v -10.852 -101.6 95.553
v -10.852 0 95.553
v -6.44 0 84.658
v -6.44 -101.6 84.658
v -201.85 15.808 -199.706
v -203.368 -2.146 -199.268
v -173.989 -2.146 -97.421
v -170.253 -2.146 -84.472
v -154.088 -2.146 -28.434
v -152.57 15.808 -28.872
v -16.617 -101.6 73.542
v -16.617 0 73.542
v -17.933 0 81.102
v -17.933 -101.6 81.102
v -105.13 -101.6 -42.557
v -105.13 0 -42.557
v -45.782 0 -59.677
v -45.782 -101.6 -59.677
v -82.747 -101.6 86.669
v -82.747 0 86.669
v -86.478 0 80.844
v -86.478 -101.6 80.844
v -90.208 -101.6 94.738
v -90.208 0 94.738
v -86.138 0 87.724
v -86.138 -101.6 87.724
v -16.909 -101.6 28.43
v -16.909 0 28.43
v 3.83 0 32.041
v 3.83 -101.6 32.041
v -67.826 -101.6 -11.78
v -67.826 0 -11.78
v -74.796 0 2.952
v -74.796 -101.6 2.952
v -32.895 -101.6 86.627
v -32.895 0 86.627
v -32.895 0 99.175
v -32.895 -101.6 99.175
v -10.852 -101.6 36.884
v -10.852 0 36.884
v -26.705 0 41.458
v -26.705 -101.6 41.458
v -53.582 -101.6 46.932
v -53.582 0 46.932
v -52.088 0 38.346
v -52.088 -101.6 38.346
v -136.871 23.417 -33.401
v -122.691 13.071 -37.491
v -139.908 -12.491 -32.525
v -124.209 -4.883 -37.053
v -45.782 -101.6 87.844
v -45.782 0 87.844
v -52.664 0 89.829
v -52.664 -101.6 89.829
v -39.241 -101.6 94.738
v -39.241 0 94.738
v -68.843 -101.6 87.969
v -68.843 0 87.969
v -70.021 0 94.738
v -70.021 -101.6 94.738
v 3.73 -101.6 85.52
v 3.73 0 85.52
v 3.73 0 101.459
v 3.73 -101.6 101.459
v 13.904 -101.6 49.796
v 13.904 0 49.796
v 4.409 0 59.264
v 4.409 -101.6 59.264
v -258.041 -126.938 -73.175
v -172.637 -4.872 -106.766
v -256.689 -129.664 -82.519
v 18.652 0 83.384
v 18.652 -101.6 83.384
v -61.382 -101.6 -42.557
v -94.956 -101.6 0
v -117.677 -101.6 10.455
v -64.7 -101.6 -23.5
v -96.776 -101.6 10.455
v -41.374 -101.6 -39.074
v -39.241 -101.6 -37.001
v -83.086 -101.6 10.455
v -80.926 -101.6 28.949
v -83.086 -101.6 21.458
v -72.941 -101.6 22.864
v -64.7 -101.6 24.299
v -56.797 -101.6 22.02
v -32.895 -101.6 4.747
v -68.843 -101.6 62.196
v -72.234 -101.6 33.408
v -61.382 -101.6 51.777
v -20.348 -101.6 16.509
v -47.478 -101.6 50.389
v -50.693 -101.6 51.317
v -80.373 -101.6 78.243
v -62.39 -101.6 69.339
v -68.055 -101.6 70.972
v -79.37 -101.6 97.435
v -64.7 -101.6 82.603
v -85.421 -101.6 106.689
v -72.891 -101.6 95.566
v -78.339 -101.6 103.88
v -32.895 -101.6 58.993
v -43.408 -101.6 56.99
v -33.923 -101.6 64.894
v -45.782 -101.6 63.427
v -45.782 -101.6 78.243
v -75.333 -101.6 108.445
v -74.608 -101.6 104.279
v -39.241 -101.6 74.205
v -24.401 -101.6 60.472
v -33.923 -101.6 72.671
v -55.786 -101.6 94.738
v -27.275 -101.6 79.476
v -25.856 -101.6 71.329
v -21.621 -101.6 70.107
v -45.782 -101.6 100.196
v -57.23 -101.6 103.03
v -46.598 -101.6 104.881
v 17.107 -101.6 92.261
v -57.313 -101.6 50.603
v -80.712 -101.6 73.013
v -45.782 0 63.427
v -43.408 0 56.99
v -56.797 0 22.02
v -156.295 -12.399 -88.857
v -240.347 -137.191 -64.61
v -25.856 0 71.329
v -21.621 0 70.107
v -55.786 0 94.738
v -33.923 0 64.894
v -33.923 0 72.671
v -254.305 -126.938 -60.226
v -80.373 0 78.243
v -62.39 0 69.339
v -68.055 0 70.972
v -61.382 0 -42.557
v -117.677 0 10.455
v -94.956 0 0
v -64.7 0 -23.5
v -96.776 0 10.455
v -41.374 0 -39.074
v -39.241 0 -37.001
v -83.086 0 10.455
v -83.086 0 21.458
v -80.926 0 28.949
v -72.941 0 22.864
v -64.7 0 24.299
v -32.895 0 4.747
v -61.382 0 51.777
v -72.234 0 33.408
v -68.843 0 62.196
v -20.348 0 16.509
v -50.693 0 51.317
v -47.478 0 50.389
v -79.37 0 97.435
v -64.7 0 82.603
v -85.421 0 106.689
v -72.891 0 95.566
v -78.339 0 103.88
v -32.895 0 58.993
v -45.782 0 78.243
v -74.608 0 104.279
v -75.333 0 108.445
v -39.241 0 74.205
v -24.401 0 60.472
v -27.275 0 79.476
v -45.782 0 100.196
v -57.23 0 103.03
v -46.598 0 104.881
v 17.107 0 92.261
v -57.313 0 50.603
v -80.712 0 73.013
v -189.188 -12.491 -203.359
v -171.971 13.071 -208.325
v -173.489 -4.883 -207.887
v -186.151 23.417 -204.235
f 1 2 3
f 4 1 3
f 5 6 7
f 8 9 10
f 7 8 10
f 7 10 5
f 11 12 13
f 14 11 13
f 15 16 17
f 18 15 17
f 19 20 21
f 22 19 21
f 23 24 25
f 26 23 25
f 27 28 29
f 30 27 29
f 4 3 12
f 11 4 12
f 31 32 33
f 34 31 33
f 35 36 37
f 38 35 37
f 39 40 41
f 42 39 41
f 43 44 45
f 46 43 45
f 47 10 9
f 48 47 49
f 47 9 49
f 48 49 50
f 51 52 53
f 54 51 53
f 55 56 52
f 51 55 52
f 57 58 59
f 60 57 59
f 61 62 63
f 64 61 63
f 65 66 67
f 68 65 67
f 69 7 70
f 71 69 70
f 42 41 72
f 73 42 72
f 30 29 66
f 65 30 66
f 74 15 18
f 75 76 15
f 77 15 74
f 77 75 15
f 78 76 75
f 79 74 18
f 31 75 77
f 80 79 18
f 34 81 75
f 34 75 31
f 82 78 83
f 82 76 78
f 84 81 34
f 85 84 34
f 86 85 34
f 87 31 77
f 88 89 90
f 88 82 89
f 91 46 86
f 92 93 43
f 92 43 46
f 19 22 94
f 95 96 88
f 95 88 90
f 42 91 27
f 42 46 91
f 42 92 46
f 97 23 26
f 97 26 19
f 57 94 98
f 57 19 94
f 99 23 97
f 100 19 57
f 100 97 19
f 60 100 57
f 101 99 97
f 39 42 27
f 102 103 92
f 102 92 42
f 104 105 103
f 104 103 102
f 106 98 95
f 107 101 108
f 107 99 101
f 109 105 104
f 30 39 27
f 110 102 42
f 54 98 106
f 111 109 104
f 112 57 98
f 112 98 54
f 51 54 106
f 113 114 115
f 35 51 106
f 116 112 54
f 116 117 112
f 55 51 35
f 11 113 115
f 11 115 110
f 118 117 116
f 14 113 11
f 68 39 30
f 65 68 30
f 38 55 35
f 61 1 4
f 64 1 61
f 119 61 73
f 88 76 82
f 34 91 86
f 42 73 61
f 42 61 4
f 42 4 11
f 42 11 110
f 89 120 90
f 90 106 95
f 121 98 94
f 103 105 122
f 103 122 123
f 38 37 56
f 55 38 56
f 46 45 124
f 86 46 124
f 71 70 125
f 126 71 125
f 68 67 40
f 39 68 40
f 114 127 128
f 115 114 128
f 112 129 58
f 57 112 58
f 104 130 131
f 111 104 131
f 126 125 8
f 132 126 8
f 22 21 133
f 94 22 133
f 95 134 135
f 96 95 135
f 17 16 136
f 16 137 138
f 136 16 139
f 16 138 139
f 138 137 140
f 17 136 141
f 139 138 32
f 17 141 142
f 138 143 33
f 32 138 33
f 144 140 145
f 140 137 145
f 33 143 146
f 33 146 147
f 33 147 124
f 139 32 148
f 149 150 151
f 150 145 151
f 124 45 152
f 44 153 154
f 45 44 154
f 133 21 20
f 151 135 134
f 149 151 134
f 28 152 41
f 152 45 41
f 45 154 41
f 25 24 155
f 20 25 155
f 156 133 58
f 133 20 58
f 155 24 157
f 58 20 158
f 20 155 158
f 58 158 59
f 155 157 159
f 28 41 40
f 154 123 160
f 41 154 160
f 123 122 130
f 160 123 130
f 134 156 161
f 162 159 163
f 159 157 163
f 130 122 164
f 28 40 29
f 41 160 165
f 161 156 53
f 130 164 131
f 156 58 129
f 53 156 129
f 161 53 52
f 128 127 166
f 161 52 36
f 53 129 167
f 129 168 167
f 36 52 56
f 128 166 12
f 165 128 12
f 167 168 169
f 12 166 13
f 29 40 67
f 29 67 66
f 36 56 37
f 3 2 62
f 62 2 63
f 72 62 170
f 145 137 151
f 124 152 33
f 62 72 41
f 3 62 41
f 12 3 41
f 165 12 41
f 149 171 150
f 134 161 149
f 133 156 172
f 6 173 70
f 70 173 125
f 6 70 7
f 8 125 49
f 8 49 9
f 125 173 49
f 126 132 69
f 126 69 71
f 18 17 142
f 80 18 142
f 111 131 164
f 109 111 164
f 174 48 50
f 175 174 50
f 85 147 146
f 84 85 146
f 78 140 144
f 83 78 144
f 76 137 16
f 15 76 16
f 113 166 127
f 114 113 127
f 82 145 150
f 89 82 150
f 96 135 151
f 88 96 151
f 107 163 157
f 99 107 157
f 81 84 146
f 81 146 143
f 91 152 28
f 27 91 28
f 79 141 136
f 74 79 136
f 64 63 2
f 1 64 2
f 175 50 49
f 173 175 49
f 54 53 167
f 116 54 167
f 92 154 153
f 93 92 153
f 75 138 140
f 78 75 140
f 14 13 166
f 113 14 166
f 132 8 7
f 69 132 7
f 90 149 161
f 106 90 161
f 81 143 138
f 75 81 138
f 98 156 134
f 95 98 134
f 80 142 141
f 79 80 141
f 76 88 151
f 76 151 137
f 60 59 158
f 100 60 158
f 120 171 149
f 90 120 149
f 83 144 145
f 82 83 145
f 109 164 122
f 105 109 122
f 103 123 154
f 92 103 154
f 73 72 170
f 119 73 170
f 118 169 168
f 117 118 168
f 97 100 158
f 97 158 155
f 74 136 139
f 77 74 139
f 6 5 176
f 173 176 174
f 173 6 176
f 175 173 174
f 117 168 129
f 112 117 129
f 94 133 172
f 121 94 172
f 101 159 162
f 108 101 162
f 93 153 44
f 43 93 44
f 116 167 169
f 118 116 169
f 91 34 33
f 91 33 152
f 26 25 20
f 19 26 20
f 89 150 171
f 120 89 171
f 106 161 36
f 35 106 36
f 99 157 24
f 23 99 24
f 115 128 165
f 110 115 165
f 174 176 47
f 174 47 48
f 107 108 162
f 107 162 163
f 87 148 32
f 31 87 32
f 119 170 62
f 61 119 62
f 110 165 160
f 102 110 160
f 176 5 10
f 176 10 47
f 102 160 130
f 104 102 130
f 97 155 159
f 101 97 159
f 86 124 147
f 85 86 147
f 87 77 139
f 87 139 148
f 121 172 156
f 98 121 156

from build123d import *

# Parameters (mm, degrees)
F1_DEPTH = 101.6
F3_DEPTH = 177.8
F5_DEPTH = 152.4


with BuildPart() as f1:
    # F0 (on Front) → F1 (new body)
    with BuildSketch(Plane.XZ):
        Polygon((-68.0546009286, 70.9724547934), (-68.8429325819, 62.1956735849), (-117.6773235202, 10.4552125558), (-105.1295995712, -42.5568968058), (-45.7822419703, -59.6766918898), (-39.2410605975, -37.0010799353), (-41.3735844195, -39.0737466514), (-61.3821223378, -42.5568968058), (-64.6995217924, -23.5004938845), (-32.8953899443, 4.7472813167), (-67.8255409002, -11.7796100676), (-74.7957791542, 2.9522271998), (-20.3476604074, 16.5085699409), (-16.9085729051, 28.4304857593), (3.830497367, 32.0408093179), (13.9042371884, 49.7960522771), (4.4086603448, 59.2635124922), (-10.8520854264, 36.8843413889), (-26.7054904199, 41.4575364871), (18.6520200223, 83.3837464452), (17.106715133, 92.2605648714), (3.7304037251, 85.5196863413), (3.7304037251, 101.45868361), (-10.8520863578, 95.5534428358), (-6.4400576502, 84.6583130124), (-16.617262736, 73.5415220261), (-17.9333650136, 81.1017135653), (-27.2746733877, 79.4755487832), (-25.8564880808, 71.3289535374), (-21.6212702161, 70.1072300284), (-24.4007783182, 60.47180738), (-32.8953899443, 58.9930382707), (-33.9227040795, 64.8943209937), (-33.9227040795, 72.6707279682), (-39.2410605975, 74.2049019812), (-45.7822419703, 63.4266734123), (-43.4083491564, 56.9902732968), (-47.4778786302, 50.3894537687), (-50.693112243, 51.316944778), (-53.5821802914, 46.9316542149), (-52.0876118716, 38.3462853462), (-56.7973518724, 22.0195347828), (-64.6995217924, 24.2990554762), (-72.941155196, 22.8643256234), (-83.0862894654, 10.4552125558), (-94.9557647109, 0), (-96.7758414889, 10.4552125558), (-83.086296916, 21.4581619948), (-80.9255126919, 28.9487209306), (-72.2342133522, 33.4082171321), (-57.3125816882, 50.6025739014), (-61.3821223378, 51.7765048871), (-45.7822419703, 78.2433673739), (-32.8953899443, 86.6274237633), (-32.8953899443, 99.1751477122), (-39.2410605975, 94.7383791208), (-45.7822419703, 87.8438726068), (-52.6642583037, 89.8291119528), (-45.7822419703, 100.1957952976), (-46.597825649, 104.8808178314), (-57.2296397348, 103.0299976952), (-55.7862083039, 94.7383791208), (-68.8429251313, 87.9693776369), (-70.0212945184, 94.7383791208), (-72.8908556805, 95.5661547972), (-79.3695133472, 97.4350382008), (-78.3385112882, 103.880263865), (-74.6080949903, 104.2788848281), (-75.3332955202, 108.4447122138), (-85.4214119311, 106.6885407045), (-90.2079790831, 94.7383791208), (-86.1384421587, 87.7243876457), (-82.747168839, 86.6685807705), (-86.4775627851, 80.8439254761), (-80.3732648492, 78.2433673739), (-80.7123929262, 73.0126127601), (-64.6995217924, 82.6028212905), (-62.3904306977, 69.3385246979), align=None)
    extrude(amount=F1_DEPTH)


with BuildPart() as f3:
    # F2 (on face) → F3 (new body)
    with BuildSketch(Plane(origin=(-19.4093784947, 0, -67.2844108638), x_dir=(0.9608220175, 0, -0.2771661067), z_dir=(-0.2771661067, 0, -0.9608220175))):
        Polygon((-125.4117596467, 12.491473315), (-140.1702057998, 2.145793902), (-138.5898076853, -15.8082350934), (-122.2509634177, -23.4165846758), (-107.4925172647, -13.0709052629), (-109.0729153791, 4.8831237325), align=None)
    extrude(amount=F3_DEPTH)

    # F4 (on face) → F5 (join)
    with BuildSketch(Plane(origin=(-45.344312599, -67.3226952588, 13.080369056), x_dir=(0.8341593789, -0.5413992144, 0.1051904043), z_dir=(-0.5515234633, -0.8188468171, 0.1590966988))):
        Polygon((-152.5998369917, -105.7350730714), (-133.0087228552, -89.5904654446), (-149.7423447495, -83.3310866593), (-154.2203182673, -96.0423000966), align=None)
    extrude(amount=F5_DEPTH)


solid = Compound([f1.part, f3.part])
